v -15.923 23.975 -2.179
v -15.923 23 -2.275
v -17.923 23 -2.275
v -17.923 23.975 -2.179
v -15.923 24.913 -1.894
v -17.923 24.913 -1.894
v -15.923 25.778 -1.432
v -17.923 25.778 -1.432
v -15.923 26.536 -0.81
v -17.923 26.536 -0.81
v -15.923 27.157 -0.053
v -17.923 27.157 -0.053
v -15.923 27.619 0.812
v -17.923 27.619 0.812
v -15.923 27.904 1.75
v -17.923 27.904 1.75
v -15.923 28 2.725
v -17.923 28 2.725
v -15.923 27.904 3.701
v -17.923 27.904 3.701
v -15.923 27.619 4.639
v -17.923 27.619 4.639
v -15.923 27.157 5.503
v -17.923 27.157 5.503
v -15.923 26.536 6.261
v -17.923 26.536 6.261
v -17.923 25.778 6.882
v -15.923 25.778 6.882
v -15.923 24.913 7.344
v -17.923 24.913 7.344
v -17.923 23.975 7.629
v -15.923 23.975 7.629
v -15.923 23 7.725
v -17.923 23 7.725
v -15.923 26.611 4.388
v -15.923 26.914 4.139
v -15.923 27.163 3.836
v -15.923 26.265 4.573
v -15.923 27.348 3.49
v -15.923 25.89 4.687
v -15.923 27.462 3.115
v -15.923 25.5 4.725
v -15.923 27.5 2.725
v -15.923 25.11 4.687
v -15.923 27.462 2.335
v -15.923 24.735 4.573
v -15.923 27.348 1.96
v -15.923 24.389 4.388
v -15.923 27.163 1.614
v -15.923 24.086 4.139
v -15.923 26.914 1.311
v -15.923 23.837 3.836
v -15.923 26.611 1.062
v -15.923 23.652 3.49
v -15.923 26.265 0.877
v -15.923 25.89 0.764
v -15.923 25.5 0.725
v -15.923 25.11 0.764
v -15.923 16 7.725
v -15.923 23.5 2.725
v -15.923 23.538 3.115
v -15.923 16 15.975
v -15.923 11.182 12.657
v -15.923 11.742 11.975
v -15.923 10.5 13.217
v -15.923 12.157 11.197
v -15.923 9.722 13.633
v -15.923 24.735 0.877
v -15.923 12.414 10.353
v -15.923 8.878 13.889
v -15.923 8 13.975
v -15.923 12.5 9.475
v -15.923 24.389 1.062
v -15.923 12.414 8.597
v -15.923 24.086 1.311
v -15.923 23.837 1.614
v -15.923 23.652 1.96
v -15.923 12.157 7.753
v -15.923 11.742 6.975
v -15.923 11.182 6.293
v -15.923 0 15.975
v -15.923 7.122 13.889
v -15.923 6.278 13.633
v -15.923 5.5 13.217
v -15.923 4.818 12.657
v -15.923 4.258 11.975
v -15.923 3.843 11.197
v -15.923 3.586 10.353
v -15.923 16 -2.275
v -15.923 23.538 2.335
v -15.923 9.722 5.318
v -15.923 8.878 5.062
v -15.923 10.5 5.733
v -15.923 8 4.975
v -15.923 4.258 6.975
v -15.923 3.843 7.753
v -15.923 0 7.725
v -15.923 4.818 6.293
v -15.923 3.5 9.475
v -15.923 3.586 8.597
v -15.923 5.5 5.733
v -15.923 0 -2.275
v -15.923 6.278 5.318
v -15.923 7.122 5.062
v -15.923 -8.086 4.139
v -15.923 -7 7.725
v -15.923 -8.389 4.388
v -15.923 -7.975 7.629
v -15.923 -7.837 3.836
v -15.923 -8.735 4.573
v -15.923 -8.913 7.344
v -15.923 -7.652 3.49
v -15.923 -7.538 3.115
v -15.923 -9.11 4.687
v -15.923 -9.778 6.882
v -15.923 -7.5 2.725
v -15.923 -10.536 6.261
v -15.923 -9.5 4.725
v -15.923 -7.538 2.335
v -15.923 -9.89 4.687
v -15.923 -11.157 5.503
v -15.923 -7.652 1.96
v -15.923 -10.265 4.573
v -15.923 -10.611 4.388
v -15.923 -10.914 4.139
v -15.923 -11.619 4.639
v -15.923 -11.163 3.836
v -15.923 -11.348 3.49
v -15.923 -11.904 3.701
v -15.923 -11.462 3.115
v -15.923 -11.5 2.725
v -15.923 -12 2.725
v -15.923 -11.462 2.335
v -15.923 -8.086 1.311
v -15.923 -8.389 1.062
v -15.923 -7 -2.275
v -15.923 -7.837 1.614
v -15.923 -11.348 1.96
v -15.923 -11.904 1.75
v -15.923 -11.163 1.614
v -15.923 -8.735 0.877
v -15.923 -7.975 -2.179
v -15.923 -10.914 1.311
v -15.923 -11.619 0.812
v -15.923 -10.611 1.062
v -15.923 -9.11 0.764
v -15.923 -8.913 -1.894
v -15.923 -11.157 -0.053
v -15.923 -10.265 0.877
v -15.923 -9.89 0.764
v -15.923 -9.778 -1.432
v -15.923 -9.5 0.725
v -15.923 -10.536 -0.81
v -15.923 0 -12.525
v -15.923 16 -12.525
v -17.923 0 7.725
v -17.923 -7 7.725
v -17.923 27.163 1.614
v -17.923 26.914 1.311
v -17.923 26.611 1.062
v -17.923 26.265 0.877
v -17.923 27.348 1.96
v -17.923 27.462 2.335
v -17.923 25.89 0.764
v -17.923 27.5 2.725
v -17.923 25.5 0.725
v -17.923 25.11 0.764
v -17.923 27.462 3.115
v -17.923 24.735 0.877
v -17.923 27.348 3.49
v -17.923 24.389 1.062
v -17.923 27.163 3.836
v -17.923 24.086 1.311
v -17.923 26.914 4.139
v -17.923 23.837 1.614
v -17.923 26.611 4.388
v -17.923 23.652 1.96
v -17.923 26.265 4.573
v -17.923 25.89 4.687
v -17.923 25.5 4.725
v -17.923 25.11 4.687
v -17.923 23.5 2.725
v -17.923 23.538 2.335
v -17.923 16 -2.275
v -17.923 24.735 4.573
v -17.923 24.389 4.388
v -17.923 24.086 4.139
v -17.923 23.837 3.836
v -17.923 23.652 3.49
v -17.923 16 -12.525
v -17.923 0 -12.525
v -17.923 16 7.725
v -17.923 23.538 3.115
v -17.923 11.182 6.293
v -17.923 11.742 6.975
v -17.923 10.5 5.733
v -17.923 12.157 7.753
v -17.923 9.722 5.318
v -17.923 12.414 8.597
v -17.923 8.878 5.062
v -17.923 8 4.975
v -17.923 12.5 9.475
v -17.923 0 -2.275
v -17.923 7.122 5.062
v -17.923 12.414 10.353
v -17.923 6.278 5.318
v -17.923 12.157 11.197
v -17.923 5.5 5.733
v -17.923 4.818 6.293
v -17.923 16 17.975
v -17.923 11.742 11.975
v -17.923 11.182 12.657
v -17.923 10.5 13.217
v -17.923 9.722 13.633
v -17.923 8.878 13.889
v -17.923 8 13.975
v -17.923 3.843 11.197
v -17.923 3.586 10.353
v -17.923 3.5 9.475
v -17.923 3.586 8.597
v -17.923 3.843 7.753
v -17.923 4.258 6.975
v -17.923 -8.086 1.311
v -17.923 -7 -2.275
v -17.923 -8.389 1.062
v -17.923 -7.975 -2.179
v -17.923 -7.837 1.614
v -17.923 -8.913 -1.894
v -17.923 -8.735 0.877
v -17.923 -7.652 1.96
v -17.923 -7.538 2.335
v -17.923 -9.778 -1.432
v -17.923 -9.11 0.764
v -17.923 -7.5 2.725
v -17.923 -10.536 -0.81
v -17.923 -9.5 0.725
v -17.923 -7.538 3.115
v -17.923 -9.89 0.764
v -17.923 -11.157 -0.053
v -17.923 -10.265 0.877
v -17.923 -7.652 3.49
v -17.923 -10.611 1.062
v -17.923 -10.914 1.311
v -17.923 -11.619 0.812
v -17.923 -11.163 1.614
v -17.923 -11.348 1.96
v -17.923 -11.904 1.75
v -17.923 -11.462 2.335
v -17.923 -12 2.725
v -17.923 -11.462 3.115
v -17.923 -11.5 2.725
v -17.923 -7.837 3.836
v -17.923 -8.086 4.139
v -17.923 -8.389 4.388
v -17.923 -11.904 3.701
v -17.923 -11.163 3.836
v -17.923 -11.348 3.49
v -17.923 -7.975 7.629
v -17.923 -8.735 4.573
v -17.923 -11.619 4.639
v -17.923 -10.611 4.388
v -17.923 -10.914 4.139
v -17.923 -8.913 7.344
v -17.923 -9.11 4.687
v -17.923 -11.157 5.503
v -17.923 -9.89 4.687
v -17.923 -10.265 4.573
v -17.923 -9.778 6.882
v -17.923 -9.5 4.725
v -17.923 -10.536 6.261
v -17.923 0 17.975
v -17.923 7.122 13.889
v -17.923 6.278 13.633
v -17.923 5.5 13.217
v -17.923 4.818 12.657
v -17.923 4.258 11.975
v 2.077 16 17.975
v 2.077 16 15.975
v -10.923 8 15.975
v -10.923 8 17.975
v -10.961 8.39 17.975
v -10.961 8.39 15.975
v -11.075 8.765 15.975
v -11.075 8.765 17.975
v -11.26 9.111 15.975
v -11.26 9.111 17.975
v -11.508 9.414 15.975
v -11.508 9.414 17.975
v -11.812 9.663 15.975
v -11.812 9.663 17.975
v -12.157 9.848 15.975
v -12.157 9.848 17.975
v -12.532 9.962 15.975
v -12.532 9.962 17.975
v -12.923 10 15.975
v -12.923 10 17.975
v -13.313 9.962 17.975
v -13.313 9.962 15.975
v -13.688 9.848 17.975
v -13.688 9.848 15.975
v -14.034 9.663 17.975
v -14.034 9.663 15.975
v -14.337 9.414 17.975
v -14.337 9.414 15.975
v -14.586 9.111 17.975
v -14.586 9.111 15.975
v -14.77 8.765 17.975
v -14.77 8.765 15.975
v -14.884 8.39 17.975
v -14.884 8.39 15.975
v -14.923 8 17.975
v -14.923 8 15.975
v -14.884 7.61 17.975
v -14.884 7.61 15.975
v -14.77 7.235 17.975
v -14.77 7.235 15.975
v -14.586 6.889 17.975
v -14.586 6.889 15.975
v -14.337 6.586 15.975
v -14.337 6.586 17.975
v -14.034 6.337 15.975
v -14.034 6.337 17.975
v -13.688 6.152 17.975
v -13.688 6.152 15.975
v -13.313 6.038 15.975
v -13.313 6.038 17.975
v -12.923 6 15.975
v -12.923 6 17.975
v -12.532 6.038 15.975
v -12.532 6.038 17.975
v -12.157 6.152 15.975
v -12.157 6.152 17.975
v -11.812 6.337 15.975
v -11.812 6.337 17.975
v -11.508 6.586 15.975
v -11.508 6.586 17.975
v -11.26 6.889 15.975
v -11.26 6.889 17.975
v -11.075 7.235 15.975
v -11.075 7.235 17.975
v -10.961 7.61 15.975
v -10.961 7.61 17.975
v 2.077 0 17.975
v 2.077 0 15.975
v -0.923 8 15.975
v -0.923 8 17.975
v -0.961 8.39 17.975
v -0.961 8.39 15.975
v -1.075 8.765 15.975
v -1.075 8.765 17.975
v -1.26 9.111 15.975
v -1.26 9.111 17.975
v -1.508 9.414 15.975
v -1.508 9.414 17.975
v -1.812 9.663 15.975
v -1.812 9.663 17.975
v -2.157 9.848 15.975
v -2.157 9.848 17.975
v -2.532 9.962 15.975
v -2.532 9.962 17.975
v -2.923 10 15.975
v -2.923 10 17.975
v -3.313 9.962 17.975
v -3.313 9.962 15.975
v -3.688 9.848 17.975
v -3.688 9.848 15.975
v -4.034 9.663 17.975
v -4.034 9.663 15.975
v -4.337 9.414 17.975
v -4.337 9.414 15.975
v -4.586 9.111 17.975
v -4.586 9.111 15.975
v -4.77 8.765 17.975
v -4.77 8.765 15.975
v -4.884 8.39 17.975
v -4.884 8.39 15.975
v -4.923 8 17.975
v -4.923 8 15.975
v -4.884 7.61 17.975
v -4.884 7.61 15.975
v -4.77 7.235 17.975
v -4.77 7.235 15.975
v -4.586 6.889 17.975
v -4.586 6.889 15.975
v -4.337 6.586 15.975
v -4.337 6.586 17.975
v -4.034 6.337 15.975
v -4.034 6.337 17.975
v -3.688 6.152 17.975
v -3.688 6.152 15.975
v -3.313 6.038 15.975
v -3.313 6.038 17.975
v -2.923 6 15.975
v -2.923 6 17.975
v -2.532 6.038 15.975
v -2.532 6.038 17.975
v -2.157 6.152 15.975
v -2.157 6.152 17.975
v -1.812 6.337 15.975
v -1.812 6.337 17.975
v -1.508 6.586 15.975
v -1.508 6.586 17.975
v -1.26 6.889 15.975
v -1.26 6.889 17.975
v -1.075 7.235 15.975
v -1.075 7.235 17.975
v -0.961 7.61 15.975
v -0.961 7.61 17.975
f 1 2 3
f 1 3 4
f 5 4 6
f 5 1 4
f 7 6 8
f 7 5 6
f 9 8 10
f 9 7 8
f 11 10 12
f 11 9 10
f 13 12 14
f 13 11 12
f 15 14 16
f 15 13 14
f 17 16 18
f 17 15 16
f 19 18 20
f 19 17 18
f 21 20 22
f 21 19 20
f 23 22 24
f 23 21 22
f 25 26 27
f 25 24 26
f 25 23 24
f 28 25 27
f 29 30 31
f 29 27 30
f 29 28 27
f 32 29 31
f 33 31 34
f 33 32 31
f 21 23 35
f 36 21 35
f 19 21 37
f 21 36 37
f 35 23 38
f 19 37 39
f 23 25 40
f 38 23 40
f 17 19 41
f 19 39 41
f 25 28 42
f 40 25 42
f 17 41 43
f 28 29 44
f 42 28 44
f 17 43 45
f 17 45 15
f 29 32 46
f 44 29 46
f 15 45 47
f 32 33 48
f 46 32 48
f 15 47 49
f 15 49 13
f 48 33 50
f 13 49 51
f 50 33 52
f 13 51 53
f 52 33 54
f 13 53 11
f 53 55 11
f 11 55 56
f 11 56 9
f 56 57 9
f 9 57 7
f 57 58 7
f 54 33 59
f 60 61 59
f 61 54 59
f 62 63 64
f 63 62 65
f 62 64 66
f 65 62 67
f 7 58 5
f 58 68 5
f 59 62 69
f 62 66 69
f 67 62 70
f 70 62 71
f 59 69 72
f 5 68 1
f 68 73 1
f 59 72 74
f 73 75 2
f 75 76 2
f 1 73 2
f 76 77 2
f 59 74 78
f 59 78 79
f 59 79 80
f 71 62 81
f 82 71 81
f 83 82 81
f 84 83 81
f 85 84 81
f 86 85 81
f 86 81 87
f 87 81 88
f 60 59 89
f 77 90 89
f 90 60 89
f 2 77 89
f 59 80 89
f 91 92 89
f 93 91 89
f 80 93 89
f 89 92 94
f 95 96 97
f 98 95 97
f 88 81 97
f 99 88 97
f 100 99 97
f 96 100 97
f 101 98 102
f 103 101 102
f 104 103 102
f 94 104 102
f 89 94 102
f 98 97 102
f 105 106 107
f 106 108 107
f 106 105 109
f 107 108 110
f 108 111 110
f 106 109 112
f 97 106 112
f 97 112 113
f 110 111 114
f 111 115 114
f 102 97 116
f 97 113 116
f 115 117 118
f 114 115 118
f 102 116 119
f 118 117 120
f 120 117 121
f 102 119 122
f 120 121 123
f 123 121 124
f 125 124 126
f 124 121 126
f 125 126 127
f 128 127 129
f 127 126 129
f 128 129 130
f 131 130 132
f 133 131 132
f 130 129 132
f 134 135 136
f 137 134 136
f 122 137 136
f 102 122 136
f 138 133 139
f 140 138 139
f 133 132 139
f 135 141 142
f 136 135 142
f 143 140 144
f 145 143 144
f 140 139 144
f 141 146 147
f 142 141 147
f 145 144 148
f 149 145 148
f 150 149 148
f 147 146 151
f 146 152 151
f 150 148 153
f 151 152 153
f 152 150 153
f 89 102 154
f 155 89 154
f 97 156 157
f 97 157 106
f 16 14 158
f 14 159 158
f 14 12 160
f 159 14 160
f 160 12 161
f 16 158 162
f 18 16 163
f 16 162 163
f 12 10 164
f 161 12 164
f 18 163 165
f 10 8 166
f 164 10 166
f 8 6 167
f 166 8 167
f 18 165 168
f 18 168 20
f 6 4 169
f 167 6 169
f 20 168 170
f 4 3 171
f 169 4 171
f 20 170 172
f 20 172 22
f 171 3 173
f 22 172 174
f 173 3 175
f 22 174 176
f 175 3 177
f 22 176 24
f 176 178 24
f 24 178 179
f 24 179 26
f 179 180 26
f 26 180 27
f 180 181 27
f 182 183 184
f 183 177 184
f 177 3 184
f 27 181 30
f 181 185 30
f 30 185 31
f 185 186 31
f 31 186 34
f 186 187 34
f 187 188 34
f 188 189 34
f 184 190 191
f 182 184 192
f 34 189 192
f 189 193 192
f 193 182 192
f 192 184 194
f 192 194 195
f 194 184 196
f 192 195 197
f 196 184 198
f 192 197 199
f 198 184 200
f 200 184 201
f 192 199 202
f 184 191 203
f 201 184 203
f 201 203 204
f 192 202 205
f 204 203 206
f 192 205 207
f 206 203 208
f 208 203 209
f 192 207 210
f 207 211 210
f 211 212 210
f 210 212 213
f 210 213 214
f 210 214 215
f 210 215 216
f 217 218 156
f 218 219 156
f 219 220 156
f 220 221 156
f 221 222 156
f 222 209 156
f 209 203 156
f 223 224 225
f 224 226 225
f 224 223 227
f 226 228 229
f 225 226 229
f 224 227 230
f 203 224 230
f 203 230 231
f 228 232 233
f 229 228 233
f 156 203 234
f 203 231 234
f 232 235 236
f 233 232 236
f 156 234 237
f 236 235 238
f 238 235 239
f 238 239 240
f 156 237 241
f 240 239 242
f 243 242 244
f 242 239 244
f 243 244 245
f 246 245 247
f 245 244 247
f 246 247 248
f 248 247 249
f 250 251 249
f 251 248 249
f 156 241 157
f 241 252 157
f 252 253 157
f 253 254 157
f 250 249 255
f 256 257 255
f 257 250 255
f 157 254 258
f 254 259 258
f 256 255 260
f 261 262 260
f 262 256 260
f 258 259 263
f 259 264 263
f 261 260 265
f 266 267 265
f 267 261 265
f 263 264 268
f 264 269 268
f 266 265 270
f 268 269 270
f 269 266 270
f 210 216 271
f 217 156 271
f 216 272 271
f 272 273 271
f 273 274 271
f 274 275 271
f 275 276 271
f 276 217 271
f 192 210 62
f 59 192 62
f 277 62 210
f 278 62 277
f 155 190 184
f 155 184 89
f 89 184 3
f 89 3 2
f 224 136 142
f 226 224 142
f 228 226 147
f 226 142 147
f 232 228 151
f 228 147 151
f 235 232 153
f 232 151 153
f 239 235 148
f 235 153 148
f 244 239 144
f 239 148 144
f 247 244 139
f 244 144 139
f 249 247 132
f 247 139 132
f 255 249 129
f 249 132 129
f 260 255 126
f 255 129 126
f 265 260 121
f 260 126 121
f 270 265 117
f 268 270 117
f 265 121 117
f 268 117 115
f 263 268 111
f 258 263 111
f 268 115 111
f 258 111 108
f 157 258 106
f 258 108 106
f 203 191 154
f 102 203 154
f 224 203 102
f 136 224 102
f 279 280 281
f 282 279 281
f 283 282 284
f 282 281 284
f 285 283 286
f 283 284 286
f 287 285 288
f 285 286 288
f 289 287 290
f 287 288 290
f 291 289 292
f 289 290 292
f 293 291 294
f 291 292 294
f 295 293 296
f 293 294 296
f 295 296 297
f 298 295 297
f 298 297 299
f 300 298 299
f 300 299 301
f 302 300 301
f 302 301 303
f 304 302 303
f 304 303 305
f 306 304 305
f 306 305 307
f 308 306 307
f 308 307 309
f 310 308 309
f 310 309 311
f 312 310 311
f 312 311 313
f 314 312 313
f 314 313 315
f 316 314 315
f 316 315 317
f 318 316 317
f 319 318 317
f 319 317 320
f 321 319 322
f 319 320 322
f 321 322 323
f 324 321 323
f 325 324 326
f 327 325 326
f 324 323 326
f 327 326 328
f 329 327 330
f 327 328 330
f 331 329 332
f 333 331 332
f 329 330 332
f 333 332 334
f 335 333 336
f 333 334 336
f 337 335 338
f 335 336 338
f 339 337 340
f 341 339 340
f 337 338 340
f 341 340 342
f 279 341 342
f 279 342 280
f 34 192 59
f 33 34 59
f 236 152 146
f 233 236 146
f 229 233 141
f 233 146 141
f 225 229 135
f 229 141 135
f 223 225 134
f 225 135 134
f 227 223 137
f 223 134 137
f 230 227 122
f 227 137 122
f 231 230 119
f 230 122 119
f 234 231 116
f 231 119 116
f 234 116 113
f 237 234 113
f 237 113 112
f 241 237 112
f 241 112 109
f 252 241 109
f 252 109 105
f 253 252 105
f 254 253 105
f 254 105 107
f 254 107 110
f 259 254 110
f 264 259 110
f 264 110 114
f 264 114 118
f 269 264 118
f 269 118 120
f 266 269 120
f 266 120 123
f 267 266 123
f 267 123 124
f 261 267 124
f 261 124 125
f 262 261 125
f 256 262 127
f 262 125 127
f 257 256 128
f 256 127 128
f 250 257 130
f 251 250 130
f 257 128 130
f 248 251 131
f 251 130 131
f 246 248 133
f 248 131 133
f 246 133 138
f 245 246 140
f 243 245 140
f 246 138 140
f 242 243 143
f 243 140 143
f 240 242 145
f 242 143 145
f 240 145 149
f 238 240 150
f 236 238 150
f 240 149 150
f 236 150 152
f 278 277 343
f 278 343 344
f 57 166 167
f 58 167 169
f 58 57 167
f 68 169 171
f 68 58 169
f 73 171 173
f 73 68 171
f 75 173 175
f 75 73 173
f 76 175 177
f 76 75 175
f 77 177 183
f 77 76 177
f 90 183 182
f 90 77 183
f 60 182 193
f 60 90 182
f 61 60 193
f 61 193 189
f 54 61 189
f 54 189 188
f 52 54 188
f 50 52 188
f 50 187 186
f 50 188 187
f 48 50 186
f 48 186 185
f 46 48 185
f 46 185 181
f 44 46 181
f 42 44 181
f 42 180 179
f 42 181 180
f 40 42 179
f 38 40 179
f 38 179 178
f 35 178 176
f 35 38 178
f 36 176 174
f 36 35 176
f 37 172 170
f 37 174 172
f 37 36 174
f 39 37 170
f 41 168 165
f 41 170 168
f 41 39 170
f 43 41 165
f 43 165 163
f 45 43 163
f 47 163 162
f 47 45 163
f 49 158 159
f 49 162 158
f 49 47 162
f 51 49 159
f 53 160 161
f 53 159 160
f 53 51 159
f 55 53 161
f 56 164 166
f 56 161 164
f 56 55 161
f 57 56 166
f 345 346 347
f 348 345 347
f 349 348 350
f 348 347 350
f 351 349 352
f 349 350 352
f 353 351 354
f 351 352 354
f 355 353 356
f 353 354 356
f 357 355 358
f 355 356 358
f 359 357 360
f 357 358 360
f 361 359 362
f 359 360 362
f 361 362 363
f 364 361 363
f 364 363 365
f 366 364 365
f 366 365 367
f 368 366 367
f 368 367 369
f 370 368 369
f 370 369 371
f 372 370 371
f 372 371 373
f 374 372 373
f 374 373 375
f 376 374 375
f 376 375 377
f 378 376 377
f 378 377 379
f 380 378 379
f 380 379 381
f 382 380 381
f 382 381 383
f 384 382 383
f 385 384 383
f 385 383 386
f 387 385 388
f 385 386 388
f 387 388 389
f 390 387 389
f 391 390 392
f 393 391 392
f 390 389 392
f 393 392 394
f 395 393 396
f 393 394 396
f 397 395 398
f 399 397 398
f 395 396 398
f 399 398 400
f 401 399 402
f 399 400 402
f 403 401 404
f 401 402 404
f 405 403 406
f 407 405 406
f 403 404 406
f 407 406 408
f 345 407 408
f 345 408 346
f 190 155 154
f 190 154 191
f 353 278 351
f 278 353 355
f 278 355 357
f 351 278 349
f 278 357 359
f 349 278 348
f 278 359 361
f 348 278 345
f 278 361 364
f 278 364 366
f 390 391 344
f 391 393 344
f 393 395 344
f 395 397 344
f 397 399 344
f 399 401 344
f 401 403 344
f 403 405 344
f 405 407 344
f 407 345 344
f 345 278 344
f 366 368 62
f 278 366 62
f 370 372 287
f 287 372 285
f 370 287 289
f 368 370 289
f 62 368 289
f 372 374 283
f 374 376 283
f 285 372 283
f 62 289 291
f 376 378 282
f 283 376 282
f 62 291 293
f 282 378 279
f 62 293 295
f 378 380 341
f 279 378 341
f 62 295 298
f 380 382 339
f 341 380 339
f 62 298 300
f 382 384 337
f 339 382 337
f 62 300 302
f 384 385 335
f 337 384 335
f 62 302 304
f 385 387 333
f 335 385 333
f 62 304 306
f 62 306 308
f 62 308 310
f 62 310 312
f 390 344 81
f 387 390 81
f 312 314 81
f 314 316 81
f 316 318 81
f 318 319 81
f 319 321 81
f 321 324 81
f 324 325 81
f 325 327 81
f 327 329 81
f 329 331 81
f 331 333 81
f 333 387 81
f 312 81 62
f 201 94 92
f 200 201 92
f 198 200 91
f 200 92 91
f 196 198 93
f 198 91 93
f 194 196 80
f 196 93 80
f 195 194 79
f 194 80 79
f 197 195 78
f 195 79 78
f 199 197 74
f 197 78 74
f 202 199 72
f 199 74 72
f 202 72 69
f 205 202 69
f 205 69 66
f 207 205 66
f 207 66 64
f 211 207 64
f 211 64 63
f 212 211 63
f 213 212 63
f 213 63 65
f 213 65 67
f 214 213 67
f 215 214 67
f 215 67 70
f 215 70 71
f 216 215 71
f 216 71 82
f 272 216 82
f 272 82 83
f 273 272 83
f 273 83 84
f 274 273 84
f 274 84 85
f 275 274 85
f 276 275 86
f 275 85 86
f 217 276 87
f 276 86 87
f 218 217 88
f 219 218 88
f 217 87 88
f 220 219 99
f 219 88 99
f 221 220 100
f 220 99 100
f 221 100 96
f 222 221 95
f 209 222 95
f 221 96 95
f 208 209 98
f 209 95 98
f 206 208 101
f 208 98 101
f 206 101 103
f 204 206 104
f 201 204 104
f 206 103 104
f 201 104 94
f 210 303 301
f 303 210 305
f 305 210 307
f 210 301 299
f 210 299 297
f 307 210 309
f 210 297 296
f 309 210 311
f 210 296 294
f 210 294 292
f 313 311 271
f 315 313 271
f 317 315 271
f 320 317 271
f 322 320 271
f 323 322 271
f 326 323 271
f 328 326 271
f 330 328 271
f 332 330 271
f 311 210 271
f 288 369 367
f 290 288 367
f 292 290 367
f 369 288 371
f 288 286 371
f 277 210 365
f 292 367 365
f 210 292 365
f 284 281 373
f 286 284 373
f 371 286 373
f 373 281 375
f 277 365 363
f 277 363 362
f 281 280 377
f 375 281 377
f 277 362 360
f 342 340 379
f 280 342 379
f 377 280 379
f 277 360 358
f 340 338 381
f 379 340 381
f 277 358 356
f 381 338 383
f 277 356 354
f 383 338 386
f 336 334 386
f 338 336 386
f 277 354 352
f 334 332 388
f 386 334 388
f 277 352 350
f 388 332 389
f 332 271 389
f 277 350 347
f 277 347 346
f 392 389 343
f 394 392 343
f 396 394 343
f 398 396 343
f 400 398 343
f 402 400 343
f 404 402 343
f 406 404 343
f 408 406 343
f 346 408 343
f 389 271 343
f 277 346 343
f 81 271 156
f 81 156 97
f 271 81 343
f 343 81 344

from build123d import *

# Parameters (mm, degrees)
BOSS_EXTRUDE1_DEPTH = 16
SKETCH4_R           = 2
CUT_EXTRUDE1_DEPTH  = 16
SKETCH6_W           = 2
SKETCH6_H           = 10
BOSS_EXTRUDE2_DEPTH = 12
CUT_EXTRUDE2_DEPTH  = 12
SKETCH8_R           = 2
CUT_EXTRUDE3_DEPTH  = 12
SKETCH9_R           = 4.5
CUT_EXTRUDE4_DEPTH  = 12


with BuildPart() as part:
    # Sketch1 → Boss-Extrude1 (new body)
    with BuildSketch(Plane(origin=(0, 0, 0), x_dir=(1, 0, 0), z_dir=(0, 1, 0))):
        Polygon((-17.922680412, 12.524914089), (-17.922680412, -17.975085911), (2.077319588, -17.975085911), (2.077319588, -15.975085911), (-15.922680412, -15.975085911), (-15.922680412, 12.524914089), align=None)
    extrude(amount=BOSS_EXTRUDE1_DEPTH)

    # Sketch4 → Cut-Extrude1 (cut)
    with BuildSketch(Plane.XY.offset(17.975085911)):
        with Locations((-12.922680412, 8)):
            Circle(SKETCH4_R)
        with Locations((-2.922680412, 8)):
            Circle(SKETCH4_R)
    extrude(amount=-CUT_EXTRUDE1_DEPTH, mode=Mode.SUBTRACT)

    # Sketch6 → Boss-Extrude2 (add)
    with BuildSketch(Plane.XZ):
        with Locations((-16.922680412, 2.725085911)):
            Rectangle(SKETCH6_W, SKETCH6_H)
    boss_extrude2 = extrude(amount=BOSS_EXTRUDE2_DEPTH)

    # Sketch7 → Cut-Extrude2 (cut)
    with BuildSketch(Plane(origin=(-15.922680412, 0, 0), x_dir=(0, 0, -1), z_dir=(1, 0, 0))):
        with BuildLine():
            Line((-11.171347401, -12.363043628), (4.929338565, -12.363043628))
            Line((4.929338565, -12.363043628), (4.929338565, -7))
            Line((4.929338565, -7), (2.274914089, -7))
            ThreePointArc((2.274914089, -7), (-2.725085911, -12), (-7.725085911, -7))
            Line((-7.725085911, -7), (-11.171347401, -7))
            Line((-11.171347401, -7), (-11.171347401, -12.363043628))
        make_face()
    cut_extrude2 = extrude(amount=-CUT_EXTRUDE2_DEPTH, mode=Mode.SUBTRACT)

    # Sketch8 → Cut-Extrude3 (cut)
    with BuildSketch(Plane(origin=(-15.922680412, 0, 0), x_dir=(0, 0, -1), z_dir=(1, 0, 0))):
        with Locations((-2.725085911, -9.5)):
            Circle(SKETCH8_R)
    cut_extrude3 = extrude(amount=-CUT_EXTRUDE3_DEPTH, mode=Mode.SUBTRACT)

    # Mirror1: Boss-Extrude2, Cut-Extrude2, Cut-Extrude3 across plane
    add(boss_extrude2.mirror(Plane(origin=(0, 8, 0), x_dir=(0, 0, 1), z_dir=(0, -1, 0))))
    add(cut_extrude2.mirror(Plane(origin=(0, 8, 0), x_dir=(0, 0, 1), z_dir=(0, -1, 0))), mode=Mode.SUBTRACT)
    add(cut_extrude3.mirror(Plane(origin=(0, 8, 0), x_dir=(0, 0, 1), z_dir=(0, -1, 0))), mode=Mode.SUBTRACT)

    # Sketch9 → Cut-Extrude4 (cut)
    with BuildSketch(Plane(origin=(-15.922680412, 0, 0), x_dir=(0, 0, -1), z_dir=(1, 0, 0))):
        with Locations((-9.475085911, 8)):
            Circle(SKETCH9_R)
    extrude(amount=-CUT_EXTRUDE4_DEPTH, mode=Mode.SUBTRACT)


solid = part.part
